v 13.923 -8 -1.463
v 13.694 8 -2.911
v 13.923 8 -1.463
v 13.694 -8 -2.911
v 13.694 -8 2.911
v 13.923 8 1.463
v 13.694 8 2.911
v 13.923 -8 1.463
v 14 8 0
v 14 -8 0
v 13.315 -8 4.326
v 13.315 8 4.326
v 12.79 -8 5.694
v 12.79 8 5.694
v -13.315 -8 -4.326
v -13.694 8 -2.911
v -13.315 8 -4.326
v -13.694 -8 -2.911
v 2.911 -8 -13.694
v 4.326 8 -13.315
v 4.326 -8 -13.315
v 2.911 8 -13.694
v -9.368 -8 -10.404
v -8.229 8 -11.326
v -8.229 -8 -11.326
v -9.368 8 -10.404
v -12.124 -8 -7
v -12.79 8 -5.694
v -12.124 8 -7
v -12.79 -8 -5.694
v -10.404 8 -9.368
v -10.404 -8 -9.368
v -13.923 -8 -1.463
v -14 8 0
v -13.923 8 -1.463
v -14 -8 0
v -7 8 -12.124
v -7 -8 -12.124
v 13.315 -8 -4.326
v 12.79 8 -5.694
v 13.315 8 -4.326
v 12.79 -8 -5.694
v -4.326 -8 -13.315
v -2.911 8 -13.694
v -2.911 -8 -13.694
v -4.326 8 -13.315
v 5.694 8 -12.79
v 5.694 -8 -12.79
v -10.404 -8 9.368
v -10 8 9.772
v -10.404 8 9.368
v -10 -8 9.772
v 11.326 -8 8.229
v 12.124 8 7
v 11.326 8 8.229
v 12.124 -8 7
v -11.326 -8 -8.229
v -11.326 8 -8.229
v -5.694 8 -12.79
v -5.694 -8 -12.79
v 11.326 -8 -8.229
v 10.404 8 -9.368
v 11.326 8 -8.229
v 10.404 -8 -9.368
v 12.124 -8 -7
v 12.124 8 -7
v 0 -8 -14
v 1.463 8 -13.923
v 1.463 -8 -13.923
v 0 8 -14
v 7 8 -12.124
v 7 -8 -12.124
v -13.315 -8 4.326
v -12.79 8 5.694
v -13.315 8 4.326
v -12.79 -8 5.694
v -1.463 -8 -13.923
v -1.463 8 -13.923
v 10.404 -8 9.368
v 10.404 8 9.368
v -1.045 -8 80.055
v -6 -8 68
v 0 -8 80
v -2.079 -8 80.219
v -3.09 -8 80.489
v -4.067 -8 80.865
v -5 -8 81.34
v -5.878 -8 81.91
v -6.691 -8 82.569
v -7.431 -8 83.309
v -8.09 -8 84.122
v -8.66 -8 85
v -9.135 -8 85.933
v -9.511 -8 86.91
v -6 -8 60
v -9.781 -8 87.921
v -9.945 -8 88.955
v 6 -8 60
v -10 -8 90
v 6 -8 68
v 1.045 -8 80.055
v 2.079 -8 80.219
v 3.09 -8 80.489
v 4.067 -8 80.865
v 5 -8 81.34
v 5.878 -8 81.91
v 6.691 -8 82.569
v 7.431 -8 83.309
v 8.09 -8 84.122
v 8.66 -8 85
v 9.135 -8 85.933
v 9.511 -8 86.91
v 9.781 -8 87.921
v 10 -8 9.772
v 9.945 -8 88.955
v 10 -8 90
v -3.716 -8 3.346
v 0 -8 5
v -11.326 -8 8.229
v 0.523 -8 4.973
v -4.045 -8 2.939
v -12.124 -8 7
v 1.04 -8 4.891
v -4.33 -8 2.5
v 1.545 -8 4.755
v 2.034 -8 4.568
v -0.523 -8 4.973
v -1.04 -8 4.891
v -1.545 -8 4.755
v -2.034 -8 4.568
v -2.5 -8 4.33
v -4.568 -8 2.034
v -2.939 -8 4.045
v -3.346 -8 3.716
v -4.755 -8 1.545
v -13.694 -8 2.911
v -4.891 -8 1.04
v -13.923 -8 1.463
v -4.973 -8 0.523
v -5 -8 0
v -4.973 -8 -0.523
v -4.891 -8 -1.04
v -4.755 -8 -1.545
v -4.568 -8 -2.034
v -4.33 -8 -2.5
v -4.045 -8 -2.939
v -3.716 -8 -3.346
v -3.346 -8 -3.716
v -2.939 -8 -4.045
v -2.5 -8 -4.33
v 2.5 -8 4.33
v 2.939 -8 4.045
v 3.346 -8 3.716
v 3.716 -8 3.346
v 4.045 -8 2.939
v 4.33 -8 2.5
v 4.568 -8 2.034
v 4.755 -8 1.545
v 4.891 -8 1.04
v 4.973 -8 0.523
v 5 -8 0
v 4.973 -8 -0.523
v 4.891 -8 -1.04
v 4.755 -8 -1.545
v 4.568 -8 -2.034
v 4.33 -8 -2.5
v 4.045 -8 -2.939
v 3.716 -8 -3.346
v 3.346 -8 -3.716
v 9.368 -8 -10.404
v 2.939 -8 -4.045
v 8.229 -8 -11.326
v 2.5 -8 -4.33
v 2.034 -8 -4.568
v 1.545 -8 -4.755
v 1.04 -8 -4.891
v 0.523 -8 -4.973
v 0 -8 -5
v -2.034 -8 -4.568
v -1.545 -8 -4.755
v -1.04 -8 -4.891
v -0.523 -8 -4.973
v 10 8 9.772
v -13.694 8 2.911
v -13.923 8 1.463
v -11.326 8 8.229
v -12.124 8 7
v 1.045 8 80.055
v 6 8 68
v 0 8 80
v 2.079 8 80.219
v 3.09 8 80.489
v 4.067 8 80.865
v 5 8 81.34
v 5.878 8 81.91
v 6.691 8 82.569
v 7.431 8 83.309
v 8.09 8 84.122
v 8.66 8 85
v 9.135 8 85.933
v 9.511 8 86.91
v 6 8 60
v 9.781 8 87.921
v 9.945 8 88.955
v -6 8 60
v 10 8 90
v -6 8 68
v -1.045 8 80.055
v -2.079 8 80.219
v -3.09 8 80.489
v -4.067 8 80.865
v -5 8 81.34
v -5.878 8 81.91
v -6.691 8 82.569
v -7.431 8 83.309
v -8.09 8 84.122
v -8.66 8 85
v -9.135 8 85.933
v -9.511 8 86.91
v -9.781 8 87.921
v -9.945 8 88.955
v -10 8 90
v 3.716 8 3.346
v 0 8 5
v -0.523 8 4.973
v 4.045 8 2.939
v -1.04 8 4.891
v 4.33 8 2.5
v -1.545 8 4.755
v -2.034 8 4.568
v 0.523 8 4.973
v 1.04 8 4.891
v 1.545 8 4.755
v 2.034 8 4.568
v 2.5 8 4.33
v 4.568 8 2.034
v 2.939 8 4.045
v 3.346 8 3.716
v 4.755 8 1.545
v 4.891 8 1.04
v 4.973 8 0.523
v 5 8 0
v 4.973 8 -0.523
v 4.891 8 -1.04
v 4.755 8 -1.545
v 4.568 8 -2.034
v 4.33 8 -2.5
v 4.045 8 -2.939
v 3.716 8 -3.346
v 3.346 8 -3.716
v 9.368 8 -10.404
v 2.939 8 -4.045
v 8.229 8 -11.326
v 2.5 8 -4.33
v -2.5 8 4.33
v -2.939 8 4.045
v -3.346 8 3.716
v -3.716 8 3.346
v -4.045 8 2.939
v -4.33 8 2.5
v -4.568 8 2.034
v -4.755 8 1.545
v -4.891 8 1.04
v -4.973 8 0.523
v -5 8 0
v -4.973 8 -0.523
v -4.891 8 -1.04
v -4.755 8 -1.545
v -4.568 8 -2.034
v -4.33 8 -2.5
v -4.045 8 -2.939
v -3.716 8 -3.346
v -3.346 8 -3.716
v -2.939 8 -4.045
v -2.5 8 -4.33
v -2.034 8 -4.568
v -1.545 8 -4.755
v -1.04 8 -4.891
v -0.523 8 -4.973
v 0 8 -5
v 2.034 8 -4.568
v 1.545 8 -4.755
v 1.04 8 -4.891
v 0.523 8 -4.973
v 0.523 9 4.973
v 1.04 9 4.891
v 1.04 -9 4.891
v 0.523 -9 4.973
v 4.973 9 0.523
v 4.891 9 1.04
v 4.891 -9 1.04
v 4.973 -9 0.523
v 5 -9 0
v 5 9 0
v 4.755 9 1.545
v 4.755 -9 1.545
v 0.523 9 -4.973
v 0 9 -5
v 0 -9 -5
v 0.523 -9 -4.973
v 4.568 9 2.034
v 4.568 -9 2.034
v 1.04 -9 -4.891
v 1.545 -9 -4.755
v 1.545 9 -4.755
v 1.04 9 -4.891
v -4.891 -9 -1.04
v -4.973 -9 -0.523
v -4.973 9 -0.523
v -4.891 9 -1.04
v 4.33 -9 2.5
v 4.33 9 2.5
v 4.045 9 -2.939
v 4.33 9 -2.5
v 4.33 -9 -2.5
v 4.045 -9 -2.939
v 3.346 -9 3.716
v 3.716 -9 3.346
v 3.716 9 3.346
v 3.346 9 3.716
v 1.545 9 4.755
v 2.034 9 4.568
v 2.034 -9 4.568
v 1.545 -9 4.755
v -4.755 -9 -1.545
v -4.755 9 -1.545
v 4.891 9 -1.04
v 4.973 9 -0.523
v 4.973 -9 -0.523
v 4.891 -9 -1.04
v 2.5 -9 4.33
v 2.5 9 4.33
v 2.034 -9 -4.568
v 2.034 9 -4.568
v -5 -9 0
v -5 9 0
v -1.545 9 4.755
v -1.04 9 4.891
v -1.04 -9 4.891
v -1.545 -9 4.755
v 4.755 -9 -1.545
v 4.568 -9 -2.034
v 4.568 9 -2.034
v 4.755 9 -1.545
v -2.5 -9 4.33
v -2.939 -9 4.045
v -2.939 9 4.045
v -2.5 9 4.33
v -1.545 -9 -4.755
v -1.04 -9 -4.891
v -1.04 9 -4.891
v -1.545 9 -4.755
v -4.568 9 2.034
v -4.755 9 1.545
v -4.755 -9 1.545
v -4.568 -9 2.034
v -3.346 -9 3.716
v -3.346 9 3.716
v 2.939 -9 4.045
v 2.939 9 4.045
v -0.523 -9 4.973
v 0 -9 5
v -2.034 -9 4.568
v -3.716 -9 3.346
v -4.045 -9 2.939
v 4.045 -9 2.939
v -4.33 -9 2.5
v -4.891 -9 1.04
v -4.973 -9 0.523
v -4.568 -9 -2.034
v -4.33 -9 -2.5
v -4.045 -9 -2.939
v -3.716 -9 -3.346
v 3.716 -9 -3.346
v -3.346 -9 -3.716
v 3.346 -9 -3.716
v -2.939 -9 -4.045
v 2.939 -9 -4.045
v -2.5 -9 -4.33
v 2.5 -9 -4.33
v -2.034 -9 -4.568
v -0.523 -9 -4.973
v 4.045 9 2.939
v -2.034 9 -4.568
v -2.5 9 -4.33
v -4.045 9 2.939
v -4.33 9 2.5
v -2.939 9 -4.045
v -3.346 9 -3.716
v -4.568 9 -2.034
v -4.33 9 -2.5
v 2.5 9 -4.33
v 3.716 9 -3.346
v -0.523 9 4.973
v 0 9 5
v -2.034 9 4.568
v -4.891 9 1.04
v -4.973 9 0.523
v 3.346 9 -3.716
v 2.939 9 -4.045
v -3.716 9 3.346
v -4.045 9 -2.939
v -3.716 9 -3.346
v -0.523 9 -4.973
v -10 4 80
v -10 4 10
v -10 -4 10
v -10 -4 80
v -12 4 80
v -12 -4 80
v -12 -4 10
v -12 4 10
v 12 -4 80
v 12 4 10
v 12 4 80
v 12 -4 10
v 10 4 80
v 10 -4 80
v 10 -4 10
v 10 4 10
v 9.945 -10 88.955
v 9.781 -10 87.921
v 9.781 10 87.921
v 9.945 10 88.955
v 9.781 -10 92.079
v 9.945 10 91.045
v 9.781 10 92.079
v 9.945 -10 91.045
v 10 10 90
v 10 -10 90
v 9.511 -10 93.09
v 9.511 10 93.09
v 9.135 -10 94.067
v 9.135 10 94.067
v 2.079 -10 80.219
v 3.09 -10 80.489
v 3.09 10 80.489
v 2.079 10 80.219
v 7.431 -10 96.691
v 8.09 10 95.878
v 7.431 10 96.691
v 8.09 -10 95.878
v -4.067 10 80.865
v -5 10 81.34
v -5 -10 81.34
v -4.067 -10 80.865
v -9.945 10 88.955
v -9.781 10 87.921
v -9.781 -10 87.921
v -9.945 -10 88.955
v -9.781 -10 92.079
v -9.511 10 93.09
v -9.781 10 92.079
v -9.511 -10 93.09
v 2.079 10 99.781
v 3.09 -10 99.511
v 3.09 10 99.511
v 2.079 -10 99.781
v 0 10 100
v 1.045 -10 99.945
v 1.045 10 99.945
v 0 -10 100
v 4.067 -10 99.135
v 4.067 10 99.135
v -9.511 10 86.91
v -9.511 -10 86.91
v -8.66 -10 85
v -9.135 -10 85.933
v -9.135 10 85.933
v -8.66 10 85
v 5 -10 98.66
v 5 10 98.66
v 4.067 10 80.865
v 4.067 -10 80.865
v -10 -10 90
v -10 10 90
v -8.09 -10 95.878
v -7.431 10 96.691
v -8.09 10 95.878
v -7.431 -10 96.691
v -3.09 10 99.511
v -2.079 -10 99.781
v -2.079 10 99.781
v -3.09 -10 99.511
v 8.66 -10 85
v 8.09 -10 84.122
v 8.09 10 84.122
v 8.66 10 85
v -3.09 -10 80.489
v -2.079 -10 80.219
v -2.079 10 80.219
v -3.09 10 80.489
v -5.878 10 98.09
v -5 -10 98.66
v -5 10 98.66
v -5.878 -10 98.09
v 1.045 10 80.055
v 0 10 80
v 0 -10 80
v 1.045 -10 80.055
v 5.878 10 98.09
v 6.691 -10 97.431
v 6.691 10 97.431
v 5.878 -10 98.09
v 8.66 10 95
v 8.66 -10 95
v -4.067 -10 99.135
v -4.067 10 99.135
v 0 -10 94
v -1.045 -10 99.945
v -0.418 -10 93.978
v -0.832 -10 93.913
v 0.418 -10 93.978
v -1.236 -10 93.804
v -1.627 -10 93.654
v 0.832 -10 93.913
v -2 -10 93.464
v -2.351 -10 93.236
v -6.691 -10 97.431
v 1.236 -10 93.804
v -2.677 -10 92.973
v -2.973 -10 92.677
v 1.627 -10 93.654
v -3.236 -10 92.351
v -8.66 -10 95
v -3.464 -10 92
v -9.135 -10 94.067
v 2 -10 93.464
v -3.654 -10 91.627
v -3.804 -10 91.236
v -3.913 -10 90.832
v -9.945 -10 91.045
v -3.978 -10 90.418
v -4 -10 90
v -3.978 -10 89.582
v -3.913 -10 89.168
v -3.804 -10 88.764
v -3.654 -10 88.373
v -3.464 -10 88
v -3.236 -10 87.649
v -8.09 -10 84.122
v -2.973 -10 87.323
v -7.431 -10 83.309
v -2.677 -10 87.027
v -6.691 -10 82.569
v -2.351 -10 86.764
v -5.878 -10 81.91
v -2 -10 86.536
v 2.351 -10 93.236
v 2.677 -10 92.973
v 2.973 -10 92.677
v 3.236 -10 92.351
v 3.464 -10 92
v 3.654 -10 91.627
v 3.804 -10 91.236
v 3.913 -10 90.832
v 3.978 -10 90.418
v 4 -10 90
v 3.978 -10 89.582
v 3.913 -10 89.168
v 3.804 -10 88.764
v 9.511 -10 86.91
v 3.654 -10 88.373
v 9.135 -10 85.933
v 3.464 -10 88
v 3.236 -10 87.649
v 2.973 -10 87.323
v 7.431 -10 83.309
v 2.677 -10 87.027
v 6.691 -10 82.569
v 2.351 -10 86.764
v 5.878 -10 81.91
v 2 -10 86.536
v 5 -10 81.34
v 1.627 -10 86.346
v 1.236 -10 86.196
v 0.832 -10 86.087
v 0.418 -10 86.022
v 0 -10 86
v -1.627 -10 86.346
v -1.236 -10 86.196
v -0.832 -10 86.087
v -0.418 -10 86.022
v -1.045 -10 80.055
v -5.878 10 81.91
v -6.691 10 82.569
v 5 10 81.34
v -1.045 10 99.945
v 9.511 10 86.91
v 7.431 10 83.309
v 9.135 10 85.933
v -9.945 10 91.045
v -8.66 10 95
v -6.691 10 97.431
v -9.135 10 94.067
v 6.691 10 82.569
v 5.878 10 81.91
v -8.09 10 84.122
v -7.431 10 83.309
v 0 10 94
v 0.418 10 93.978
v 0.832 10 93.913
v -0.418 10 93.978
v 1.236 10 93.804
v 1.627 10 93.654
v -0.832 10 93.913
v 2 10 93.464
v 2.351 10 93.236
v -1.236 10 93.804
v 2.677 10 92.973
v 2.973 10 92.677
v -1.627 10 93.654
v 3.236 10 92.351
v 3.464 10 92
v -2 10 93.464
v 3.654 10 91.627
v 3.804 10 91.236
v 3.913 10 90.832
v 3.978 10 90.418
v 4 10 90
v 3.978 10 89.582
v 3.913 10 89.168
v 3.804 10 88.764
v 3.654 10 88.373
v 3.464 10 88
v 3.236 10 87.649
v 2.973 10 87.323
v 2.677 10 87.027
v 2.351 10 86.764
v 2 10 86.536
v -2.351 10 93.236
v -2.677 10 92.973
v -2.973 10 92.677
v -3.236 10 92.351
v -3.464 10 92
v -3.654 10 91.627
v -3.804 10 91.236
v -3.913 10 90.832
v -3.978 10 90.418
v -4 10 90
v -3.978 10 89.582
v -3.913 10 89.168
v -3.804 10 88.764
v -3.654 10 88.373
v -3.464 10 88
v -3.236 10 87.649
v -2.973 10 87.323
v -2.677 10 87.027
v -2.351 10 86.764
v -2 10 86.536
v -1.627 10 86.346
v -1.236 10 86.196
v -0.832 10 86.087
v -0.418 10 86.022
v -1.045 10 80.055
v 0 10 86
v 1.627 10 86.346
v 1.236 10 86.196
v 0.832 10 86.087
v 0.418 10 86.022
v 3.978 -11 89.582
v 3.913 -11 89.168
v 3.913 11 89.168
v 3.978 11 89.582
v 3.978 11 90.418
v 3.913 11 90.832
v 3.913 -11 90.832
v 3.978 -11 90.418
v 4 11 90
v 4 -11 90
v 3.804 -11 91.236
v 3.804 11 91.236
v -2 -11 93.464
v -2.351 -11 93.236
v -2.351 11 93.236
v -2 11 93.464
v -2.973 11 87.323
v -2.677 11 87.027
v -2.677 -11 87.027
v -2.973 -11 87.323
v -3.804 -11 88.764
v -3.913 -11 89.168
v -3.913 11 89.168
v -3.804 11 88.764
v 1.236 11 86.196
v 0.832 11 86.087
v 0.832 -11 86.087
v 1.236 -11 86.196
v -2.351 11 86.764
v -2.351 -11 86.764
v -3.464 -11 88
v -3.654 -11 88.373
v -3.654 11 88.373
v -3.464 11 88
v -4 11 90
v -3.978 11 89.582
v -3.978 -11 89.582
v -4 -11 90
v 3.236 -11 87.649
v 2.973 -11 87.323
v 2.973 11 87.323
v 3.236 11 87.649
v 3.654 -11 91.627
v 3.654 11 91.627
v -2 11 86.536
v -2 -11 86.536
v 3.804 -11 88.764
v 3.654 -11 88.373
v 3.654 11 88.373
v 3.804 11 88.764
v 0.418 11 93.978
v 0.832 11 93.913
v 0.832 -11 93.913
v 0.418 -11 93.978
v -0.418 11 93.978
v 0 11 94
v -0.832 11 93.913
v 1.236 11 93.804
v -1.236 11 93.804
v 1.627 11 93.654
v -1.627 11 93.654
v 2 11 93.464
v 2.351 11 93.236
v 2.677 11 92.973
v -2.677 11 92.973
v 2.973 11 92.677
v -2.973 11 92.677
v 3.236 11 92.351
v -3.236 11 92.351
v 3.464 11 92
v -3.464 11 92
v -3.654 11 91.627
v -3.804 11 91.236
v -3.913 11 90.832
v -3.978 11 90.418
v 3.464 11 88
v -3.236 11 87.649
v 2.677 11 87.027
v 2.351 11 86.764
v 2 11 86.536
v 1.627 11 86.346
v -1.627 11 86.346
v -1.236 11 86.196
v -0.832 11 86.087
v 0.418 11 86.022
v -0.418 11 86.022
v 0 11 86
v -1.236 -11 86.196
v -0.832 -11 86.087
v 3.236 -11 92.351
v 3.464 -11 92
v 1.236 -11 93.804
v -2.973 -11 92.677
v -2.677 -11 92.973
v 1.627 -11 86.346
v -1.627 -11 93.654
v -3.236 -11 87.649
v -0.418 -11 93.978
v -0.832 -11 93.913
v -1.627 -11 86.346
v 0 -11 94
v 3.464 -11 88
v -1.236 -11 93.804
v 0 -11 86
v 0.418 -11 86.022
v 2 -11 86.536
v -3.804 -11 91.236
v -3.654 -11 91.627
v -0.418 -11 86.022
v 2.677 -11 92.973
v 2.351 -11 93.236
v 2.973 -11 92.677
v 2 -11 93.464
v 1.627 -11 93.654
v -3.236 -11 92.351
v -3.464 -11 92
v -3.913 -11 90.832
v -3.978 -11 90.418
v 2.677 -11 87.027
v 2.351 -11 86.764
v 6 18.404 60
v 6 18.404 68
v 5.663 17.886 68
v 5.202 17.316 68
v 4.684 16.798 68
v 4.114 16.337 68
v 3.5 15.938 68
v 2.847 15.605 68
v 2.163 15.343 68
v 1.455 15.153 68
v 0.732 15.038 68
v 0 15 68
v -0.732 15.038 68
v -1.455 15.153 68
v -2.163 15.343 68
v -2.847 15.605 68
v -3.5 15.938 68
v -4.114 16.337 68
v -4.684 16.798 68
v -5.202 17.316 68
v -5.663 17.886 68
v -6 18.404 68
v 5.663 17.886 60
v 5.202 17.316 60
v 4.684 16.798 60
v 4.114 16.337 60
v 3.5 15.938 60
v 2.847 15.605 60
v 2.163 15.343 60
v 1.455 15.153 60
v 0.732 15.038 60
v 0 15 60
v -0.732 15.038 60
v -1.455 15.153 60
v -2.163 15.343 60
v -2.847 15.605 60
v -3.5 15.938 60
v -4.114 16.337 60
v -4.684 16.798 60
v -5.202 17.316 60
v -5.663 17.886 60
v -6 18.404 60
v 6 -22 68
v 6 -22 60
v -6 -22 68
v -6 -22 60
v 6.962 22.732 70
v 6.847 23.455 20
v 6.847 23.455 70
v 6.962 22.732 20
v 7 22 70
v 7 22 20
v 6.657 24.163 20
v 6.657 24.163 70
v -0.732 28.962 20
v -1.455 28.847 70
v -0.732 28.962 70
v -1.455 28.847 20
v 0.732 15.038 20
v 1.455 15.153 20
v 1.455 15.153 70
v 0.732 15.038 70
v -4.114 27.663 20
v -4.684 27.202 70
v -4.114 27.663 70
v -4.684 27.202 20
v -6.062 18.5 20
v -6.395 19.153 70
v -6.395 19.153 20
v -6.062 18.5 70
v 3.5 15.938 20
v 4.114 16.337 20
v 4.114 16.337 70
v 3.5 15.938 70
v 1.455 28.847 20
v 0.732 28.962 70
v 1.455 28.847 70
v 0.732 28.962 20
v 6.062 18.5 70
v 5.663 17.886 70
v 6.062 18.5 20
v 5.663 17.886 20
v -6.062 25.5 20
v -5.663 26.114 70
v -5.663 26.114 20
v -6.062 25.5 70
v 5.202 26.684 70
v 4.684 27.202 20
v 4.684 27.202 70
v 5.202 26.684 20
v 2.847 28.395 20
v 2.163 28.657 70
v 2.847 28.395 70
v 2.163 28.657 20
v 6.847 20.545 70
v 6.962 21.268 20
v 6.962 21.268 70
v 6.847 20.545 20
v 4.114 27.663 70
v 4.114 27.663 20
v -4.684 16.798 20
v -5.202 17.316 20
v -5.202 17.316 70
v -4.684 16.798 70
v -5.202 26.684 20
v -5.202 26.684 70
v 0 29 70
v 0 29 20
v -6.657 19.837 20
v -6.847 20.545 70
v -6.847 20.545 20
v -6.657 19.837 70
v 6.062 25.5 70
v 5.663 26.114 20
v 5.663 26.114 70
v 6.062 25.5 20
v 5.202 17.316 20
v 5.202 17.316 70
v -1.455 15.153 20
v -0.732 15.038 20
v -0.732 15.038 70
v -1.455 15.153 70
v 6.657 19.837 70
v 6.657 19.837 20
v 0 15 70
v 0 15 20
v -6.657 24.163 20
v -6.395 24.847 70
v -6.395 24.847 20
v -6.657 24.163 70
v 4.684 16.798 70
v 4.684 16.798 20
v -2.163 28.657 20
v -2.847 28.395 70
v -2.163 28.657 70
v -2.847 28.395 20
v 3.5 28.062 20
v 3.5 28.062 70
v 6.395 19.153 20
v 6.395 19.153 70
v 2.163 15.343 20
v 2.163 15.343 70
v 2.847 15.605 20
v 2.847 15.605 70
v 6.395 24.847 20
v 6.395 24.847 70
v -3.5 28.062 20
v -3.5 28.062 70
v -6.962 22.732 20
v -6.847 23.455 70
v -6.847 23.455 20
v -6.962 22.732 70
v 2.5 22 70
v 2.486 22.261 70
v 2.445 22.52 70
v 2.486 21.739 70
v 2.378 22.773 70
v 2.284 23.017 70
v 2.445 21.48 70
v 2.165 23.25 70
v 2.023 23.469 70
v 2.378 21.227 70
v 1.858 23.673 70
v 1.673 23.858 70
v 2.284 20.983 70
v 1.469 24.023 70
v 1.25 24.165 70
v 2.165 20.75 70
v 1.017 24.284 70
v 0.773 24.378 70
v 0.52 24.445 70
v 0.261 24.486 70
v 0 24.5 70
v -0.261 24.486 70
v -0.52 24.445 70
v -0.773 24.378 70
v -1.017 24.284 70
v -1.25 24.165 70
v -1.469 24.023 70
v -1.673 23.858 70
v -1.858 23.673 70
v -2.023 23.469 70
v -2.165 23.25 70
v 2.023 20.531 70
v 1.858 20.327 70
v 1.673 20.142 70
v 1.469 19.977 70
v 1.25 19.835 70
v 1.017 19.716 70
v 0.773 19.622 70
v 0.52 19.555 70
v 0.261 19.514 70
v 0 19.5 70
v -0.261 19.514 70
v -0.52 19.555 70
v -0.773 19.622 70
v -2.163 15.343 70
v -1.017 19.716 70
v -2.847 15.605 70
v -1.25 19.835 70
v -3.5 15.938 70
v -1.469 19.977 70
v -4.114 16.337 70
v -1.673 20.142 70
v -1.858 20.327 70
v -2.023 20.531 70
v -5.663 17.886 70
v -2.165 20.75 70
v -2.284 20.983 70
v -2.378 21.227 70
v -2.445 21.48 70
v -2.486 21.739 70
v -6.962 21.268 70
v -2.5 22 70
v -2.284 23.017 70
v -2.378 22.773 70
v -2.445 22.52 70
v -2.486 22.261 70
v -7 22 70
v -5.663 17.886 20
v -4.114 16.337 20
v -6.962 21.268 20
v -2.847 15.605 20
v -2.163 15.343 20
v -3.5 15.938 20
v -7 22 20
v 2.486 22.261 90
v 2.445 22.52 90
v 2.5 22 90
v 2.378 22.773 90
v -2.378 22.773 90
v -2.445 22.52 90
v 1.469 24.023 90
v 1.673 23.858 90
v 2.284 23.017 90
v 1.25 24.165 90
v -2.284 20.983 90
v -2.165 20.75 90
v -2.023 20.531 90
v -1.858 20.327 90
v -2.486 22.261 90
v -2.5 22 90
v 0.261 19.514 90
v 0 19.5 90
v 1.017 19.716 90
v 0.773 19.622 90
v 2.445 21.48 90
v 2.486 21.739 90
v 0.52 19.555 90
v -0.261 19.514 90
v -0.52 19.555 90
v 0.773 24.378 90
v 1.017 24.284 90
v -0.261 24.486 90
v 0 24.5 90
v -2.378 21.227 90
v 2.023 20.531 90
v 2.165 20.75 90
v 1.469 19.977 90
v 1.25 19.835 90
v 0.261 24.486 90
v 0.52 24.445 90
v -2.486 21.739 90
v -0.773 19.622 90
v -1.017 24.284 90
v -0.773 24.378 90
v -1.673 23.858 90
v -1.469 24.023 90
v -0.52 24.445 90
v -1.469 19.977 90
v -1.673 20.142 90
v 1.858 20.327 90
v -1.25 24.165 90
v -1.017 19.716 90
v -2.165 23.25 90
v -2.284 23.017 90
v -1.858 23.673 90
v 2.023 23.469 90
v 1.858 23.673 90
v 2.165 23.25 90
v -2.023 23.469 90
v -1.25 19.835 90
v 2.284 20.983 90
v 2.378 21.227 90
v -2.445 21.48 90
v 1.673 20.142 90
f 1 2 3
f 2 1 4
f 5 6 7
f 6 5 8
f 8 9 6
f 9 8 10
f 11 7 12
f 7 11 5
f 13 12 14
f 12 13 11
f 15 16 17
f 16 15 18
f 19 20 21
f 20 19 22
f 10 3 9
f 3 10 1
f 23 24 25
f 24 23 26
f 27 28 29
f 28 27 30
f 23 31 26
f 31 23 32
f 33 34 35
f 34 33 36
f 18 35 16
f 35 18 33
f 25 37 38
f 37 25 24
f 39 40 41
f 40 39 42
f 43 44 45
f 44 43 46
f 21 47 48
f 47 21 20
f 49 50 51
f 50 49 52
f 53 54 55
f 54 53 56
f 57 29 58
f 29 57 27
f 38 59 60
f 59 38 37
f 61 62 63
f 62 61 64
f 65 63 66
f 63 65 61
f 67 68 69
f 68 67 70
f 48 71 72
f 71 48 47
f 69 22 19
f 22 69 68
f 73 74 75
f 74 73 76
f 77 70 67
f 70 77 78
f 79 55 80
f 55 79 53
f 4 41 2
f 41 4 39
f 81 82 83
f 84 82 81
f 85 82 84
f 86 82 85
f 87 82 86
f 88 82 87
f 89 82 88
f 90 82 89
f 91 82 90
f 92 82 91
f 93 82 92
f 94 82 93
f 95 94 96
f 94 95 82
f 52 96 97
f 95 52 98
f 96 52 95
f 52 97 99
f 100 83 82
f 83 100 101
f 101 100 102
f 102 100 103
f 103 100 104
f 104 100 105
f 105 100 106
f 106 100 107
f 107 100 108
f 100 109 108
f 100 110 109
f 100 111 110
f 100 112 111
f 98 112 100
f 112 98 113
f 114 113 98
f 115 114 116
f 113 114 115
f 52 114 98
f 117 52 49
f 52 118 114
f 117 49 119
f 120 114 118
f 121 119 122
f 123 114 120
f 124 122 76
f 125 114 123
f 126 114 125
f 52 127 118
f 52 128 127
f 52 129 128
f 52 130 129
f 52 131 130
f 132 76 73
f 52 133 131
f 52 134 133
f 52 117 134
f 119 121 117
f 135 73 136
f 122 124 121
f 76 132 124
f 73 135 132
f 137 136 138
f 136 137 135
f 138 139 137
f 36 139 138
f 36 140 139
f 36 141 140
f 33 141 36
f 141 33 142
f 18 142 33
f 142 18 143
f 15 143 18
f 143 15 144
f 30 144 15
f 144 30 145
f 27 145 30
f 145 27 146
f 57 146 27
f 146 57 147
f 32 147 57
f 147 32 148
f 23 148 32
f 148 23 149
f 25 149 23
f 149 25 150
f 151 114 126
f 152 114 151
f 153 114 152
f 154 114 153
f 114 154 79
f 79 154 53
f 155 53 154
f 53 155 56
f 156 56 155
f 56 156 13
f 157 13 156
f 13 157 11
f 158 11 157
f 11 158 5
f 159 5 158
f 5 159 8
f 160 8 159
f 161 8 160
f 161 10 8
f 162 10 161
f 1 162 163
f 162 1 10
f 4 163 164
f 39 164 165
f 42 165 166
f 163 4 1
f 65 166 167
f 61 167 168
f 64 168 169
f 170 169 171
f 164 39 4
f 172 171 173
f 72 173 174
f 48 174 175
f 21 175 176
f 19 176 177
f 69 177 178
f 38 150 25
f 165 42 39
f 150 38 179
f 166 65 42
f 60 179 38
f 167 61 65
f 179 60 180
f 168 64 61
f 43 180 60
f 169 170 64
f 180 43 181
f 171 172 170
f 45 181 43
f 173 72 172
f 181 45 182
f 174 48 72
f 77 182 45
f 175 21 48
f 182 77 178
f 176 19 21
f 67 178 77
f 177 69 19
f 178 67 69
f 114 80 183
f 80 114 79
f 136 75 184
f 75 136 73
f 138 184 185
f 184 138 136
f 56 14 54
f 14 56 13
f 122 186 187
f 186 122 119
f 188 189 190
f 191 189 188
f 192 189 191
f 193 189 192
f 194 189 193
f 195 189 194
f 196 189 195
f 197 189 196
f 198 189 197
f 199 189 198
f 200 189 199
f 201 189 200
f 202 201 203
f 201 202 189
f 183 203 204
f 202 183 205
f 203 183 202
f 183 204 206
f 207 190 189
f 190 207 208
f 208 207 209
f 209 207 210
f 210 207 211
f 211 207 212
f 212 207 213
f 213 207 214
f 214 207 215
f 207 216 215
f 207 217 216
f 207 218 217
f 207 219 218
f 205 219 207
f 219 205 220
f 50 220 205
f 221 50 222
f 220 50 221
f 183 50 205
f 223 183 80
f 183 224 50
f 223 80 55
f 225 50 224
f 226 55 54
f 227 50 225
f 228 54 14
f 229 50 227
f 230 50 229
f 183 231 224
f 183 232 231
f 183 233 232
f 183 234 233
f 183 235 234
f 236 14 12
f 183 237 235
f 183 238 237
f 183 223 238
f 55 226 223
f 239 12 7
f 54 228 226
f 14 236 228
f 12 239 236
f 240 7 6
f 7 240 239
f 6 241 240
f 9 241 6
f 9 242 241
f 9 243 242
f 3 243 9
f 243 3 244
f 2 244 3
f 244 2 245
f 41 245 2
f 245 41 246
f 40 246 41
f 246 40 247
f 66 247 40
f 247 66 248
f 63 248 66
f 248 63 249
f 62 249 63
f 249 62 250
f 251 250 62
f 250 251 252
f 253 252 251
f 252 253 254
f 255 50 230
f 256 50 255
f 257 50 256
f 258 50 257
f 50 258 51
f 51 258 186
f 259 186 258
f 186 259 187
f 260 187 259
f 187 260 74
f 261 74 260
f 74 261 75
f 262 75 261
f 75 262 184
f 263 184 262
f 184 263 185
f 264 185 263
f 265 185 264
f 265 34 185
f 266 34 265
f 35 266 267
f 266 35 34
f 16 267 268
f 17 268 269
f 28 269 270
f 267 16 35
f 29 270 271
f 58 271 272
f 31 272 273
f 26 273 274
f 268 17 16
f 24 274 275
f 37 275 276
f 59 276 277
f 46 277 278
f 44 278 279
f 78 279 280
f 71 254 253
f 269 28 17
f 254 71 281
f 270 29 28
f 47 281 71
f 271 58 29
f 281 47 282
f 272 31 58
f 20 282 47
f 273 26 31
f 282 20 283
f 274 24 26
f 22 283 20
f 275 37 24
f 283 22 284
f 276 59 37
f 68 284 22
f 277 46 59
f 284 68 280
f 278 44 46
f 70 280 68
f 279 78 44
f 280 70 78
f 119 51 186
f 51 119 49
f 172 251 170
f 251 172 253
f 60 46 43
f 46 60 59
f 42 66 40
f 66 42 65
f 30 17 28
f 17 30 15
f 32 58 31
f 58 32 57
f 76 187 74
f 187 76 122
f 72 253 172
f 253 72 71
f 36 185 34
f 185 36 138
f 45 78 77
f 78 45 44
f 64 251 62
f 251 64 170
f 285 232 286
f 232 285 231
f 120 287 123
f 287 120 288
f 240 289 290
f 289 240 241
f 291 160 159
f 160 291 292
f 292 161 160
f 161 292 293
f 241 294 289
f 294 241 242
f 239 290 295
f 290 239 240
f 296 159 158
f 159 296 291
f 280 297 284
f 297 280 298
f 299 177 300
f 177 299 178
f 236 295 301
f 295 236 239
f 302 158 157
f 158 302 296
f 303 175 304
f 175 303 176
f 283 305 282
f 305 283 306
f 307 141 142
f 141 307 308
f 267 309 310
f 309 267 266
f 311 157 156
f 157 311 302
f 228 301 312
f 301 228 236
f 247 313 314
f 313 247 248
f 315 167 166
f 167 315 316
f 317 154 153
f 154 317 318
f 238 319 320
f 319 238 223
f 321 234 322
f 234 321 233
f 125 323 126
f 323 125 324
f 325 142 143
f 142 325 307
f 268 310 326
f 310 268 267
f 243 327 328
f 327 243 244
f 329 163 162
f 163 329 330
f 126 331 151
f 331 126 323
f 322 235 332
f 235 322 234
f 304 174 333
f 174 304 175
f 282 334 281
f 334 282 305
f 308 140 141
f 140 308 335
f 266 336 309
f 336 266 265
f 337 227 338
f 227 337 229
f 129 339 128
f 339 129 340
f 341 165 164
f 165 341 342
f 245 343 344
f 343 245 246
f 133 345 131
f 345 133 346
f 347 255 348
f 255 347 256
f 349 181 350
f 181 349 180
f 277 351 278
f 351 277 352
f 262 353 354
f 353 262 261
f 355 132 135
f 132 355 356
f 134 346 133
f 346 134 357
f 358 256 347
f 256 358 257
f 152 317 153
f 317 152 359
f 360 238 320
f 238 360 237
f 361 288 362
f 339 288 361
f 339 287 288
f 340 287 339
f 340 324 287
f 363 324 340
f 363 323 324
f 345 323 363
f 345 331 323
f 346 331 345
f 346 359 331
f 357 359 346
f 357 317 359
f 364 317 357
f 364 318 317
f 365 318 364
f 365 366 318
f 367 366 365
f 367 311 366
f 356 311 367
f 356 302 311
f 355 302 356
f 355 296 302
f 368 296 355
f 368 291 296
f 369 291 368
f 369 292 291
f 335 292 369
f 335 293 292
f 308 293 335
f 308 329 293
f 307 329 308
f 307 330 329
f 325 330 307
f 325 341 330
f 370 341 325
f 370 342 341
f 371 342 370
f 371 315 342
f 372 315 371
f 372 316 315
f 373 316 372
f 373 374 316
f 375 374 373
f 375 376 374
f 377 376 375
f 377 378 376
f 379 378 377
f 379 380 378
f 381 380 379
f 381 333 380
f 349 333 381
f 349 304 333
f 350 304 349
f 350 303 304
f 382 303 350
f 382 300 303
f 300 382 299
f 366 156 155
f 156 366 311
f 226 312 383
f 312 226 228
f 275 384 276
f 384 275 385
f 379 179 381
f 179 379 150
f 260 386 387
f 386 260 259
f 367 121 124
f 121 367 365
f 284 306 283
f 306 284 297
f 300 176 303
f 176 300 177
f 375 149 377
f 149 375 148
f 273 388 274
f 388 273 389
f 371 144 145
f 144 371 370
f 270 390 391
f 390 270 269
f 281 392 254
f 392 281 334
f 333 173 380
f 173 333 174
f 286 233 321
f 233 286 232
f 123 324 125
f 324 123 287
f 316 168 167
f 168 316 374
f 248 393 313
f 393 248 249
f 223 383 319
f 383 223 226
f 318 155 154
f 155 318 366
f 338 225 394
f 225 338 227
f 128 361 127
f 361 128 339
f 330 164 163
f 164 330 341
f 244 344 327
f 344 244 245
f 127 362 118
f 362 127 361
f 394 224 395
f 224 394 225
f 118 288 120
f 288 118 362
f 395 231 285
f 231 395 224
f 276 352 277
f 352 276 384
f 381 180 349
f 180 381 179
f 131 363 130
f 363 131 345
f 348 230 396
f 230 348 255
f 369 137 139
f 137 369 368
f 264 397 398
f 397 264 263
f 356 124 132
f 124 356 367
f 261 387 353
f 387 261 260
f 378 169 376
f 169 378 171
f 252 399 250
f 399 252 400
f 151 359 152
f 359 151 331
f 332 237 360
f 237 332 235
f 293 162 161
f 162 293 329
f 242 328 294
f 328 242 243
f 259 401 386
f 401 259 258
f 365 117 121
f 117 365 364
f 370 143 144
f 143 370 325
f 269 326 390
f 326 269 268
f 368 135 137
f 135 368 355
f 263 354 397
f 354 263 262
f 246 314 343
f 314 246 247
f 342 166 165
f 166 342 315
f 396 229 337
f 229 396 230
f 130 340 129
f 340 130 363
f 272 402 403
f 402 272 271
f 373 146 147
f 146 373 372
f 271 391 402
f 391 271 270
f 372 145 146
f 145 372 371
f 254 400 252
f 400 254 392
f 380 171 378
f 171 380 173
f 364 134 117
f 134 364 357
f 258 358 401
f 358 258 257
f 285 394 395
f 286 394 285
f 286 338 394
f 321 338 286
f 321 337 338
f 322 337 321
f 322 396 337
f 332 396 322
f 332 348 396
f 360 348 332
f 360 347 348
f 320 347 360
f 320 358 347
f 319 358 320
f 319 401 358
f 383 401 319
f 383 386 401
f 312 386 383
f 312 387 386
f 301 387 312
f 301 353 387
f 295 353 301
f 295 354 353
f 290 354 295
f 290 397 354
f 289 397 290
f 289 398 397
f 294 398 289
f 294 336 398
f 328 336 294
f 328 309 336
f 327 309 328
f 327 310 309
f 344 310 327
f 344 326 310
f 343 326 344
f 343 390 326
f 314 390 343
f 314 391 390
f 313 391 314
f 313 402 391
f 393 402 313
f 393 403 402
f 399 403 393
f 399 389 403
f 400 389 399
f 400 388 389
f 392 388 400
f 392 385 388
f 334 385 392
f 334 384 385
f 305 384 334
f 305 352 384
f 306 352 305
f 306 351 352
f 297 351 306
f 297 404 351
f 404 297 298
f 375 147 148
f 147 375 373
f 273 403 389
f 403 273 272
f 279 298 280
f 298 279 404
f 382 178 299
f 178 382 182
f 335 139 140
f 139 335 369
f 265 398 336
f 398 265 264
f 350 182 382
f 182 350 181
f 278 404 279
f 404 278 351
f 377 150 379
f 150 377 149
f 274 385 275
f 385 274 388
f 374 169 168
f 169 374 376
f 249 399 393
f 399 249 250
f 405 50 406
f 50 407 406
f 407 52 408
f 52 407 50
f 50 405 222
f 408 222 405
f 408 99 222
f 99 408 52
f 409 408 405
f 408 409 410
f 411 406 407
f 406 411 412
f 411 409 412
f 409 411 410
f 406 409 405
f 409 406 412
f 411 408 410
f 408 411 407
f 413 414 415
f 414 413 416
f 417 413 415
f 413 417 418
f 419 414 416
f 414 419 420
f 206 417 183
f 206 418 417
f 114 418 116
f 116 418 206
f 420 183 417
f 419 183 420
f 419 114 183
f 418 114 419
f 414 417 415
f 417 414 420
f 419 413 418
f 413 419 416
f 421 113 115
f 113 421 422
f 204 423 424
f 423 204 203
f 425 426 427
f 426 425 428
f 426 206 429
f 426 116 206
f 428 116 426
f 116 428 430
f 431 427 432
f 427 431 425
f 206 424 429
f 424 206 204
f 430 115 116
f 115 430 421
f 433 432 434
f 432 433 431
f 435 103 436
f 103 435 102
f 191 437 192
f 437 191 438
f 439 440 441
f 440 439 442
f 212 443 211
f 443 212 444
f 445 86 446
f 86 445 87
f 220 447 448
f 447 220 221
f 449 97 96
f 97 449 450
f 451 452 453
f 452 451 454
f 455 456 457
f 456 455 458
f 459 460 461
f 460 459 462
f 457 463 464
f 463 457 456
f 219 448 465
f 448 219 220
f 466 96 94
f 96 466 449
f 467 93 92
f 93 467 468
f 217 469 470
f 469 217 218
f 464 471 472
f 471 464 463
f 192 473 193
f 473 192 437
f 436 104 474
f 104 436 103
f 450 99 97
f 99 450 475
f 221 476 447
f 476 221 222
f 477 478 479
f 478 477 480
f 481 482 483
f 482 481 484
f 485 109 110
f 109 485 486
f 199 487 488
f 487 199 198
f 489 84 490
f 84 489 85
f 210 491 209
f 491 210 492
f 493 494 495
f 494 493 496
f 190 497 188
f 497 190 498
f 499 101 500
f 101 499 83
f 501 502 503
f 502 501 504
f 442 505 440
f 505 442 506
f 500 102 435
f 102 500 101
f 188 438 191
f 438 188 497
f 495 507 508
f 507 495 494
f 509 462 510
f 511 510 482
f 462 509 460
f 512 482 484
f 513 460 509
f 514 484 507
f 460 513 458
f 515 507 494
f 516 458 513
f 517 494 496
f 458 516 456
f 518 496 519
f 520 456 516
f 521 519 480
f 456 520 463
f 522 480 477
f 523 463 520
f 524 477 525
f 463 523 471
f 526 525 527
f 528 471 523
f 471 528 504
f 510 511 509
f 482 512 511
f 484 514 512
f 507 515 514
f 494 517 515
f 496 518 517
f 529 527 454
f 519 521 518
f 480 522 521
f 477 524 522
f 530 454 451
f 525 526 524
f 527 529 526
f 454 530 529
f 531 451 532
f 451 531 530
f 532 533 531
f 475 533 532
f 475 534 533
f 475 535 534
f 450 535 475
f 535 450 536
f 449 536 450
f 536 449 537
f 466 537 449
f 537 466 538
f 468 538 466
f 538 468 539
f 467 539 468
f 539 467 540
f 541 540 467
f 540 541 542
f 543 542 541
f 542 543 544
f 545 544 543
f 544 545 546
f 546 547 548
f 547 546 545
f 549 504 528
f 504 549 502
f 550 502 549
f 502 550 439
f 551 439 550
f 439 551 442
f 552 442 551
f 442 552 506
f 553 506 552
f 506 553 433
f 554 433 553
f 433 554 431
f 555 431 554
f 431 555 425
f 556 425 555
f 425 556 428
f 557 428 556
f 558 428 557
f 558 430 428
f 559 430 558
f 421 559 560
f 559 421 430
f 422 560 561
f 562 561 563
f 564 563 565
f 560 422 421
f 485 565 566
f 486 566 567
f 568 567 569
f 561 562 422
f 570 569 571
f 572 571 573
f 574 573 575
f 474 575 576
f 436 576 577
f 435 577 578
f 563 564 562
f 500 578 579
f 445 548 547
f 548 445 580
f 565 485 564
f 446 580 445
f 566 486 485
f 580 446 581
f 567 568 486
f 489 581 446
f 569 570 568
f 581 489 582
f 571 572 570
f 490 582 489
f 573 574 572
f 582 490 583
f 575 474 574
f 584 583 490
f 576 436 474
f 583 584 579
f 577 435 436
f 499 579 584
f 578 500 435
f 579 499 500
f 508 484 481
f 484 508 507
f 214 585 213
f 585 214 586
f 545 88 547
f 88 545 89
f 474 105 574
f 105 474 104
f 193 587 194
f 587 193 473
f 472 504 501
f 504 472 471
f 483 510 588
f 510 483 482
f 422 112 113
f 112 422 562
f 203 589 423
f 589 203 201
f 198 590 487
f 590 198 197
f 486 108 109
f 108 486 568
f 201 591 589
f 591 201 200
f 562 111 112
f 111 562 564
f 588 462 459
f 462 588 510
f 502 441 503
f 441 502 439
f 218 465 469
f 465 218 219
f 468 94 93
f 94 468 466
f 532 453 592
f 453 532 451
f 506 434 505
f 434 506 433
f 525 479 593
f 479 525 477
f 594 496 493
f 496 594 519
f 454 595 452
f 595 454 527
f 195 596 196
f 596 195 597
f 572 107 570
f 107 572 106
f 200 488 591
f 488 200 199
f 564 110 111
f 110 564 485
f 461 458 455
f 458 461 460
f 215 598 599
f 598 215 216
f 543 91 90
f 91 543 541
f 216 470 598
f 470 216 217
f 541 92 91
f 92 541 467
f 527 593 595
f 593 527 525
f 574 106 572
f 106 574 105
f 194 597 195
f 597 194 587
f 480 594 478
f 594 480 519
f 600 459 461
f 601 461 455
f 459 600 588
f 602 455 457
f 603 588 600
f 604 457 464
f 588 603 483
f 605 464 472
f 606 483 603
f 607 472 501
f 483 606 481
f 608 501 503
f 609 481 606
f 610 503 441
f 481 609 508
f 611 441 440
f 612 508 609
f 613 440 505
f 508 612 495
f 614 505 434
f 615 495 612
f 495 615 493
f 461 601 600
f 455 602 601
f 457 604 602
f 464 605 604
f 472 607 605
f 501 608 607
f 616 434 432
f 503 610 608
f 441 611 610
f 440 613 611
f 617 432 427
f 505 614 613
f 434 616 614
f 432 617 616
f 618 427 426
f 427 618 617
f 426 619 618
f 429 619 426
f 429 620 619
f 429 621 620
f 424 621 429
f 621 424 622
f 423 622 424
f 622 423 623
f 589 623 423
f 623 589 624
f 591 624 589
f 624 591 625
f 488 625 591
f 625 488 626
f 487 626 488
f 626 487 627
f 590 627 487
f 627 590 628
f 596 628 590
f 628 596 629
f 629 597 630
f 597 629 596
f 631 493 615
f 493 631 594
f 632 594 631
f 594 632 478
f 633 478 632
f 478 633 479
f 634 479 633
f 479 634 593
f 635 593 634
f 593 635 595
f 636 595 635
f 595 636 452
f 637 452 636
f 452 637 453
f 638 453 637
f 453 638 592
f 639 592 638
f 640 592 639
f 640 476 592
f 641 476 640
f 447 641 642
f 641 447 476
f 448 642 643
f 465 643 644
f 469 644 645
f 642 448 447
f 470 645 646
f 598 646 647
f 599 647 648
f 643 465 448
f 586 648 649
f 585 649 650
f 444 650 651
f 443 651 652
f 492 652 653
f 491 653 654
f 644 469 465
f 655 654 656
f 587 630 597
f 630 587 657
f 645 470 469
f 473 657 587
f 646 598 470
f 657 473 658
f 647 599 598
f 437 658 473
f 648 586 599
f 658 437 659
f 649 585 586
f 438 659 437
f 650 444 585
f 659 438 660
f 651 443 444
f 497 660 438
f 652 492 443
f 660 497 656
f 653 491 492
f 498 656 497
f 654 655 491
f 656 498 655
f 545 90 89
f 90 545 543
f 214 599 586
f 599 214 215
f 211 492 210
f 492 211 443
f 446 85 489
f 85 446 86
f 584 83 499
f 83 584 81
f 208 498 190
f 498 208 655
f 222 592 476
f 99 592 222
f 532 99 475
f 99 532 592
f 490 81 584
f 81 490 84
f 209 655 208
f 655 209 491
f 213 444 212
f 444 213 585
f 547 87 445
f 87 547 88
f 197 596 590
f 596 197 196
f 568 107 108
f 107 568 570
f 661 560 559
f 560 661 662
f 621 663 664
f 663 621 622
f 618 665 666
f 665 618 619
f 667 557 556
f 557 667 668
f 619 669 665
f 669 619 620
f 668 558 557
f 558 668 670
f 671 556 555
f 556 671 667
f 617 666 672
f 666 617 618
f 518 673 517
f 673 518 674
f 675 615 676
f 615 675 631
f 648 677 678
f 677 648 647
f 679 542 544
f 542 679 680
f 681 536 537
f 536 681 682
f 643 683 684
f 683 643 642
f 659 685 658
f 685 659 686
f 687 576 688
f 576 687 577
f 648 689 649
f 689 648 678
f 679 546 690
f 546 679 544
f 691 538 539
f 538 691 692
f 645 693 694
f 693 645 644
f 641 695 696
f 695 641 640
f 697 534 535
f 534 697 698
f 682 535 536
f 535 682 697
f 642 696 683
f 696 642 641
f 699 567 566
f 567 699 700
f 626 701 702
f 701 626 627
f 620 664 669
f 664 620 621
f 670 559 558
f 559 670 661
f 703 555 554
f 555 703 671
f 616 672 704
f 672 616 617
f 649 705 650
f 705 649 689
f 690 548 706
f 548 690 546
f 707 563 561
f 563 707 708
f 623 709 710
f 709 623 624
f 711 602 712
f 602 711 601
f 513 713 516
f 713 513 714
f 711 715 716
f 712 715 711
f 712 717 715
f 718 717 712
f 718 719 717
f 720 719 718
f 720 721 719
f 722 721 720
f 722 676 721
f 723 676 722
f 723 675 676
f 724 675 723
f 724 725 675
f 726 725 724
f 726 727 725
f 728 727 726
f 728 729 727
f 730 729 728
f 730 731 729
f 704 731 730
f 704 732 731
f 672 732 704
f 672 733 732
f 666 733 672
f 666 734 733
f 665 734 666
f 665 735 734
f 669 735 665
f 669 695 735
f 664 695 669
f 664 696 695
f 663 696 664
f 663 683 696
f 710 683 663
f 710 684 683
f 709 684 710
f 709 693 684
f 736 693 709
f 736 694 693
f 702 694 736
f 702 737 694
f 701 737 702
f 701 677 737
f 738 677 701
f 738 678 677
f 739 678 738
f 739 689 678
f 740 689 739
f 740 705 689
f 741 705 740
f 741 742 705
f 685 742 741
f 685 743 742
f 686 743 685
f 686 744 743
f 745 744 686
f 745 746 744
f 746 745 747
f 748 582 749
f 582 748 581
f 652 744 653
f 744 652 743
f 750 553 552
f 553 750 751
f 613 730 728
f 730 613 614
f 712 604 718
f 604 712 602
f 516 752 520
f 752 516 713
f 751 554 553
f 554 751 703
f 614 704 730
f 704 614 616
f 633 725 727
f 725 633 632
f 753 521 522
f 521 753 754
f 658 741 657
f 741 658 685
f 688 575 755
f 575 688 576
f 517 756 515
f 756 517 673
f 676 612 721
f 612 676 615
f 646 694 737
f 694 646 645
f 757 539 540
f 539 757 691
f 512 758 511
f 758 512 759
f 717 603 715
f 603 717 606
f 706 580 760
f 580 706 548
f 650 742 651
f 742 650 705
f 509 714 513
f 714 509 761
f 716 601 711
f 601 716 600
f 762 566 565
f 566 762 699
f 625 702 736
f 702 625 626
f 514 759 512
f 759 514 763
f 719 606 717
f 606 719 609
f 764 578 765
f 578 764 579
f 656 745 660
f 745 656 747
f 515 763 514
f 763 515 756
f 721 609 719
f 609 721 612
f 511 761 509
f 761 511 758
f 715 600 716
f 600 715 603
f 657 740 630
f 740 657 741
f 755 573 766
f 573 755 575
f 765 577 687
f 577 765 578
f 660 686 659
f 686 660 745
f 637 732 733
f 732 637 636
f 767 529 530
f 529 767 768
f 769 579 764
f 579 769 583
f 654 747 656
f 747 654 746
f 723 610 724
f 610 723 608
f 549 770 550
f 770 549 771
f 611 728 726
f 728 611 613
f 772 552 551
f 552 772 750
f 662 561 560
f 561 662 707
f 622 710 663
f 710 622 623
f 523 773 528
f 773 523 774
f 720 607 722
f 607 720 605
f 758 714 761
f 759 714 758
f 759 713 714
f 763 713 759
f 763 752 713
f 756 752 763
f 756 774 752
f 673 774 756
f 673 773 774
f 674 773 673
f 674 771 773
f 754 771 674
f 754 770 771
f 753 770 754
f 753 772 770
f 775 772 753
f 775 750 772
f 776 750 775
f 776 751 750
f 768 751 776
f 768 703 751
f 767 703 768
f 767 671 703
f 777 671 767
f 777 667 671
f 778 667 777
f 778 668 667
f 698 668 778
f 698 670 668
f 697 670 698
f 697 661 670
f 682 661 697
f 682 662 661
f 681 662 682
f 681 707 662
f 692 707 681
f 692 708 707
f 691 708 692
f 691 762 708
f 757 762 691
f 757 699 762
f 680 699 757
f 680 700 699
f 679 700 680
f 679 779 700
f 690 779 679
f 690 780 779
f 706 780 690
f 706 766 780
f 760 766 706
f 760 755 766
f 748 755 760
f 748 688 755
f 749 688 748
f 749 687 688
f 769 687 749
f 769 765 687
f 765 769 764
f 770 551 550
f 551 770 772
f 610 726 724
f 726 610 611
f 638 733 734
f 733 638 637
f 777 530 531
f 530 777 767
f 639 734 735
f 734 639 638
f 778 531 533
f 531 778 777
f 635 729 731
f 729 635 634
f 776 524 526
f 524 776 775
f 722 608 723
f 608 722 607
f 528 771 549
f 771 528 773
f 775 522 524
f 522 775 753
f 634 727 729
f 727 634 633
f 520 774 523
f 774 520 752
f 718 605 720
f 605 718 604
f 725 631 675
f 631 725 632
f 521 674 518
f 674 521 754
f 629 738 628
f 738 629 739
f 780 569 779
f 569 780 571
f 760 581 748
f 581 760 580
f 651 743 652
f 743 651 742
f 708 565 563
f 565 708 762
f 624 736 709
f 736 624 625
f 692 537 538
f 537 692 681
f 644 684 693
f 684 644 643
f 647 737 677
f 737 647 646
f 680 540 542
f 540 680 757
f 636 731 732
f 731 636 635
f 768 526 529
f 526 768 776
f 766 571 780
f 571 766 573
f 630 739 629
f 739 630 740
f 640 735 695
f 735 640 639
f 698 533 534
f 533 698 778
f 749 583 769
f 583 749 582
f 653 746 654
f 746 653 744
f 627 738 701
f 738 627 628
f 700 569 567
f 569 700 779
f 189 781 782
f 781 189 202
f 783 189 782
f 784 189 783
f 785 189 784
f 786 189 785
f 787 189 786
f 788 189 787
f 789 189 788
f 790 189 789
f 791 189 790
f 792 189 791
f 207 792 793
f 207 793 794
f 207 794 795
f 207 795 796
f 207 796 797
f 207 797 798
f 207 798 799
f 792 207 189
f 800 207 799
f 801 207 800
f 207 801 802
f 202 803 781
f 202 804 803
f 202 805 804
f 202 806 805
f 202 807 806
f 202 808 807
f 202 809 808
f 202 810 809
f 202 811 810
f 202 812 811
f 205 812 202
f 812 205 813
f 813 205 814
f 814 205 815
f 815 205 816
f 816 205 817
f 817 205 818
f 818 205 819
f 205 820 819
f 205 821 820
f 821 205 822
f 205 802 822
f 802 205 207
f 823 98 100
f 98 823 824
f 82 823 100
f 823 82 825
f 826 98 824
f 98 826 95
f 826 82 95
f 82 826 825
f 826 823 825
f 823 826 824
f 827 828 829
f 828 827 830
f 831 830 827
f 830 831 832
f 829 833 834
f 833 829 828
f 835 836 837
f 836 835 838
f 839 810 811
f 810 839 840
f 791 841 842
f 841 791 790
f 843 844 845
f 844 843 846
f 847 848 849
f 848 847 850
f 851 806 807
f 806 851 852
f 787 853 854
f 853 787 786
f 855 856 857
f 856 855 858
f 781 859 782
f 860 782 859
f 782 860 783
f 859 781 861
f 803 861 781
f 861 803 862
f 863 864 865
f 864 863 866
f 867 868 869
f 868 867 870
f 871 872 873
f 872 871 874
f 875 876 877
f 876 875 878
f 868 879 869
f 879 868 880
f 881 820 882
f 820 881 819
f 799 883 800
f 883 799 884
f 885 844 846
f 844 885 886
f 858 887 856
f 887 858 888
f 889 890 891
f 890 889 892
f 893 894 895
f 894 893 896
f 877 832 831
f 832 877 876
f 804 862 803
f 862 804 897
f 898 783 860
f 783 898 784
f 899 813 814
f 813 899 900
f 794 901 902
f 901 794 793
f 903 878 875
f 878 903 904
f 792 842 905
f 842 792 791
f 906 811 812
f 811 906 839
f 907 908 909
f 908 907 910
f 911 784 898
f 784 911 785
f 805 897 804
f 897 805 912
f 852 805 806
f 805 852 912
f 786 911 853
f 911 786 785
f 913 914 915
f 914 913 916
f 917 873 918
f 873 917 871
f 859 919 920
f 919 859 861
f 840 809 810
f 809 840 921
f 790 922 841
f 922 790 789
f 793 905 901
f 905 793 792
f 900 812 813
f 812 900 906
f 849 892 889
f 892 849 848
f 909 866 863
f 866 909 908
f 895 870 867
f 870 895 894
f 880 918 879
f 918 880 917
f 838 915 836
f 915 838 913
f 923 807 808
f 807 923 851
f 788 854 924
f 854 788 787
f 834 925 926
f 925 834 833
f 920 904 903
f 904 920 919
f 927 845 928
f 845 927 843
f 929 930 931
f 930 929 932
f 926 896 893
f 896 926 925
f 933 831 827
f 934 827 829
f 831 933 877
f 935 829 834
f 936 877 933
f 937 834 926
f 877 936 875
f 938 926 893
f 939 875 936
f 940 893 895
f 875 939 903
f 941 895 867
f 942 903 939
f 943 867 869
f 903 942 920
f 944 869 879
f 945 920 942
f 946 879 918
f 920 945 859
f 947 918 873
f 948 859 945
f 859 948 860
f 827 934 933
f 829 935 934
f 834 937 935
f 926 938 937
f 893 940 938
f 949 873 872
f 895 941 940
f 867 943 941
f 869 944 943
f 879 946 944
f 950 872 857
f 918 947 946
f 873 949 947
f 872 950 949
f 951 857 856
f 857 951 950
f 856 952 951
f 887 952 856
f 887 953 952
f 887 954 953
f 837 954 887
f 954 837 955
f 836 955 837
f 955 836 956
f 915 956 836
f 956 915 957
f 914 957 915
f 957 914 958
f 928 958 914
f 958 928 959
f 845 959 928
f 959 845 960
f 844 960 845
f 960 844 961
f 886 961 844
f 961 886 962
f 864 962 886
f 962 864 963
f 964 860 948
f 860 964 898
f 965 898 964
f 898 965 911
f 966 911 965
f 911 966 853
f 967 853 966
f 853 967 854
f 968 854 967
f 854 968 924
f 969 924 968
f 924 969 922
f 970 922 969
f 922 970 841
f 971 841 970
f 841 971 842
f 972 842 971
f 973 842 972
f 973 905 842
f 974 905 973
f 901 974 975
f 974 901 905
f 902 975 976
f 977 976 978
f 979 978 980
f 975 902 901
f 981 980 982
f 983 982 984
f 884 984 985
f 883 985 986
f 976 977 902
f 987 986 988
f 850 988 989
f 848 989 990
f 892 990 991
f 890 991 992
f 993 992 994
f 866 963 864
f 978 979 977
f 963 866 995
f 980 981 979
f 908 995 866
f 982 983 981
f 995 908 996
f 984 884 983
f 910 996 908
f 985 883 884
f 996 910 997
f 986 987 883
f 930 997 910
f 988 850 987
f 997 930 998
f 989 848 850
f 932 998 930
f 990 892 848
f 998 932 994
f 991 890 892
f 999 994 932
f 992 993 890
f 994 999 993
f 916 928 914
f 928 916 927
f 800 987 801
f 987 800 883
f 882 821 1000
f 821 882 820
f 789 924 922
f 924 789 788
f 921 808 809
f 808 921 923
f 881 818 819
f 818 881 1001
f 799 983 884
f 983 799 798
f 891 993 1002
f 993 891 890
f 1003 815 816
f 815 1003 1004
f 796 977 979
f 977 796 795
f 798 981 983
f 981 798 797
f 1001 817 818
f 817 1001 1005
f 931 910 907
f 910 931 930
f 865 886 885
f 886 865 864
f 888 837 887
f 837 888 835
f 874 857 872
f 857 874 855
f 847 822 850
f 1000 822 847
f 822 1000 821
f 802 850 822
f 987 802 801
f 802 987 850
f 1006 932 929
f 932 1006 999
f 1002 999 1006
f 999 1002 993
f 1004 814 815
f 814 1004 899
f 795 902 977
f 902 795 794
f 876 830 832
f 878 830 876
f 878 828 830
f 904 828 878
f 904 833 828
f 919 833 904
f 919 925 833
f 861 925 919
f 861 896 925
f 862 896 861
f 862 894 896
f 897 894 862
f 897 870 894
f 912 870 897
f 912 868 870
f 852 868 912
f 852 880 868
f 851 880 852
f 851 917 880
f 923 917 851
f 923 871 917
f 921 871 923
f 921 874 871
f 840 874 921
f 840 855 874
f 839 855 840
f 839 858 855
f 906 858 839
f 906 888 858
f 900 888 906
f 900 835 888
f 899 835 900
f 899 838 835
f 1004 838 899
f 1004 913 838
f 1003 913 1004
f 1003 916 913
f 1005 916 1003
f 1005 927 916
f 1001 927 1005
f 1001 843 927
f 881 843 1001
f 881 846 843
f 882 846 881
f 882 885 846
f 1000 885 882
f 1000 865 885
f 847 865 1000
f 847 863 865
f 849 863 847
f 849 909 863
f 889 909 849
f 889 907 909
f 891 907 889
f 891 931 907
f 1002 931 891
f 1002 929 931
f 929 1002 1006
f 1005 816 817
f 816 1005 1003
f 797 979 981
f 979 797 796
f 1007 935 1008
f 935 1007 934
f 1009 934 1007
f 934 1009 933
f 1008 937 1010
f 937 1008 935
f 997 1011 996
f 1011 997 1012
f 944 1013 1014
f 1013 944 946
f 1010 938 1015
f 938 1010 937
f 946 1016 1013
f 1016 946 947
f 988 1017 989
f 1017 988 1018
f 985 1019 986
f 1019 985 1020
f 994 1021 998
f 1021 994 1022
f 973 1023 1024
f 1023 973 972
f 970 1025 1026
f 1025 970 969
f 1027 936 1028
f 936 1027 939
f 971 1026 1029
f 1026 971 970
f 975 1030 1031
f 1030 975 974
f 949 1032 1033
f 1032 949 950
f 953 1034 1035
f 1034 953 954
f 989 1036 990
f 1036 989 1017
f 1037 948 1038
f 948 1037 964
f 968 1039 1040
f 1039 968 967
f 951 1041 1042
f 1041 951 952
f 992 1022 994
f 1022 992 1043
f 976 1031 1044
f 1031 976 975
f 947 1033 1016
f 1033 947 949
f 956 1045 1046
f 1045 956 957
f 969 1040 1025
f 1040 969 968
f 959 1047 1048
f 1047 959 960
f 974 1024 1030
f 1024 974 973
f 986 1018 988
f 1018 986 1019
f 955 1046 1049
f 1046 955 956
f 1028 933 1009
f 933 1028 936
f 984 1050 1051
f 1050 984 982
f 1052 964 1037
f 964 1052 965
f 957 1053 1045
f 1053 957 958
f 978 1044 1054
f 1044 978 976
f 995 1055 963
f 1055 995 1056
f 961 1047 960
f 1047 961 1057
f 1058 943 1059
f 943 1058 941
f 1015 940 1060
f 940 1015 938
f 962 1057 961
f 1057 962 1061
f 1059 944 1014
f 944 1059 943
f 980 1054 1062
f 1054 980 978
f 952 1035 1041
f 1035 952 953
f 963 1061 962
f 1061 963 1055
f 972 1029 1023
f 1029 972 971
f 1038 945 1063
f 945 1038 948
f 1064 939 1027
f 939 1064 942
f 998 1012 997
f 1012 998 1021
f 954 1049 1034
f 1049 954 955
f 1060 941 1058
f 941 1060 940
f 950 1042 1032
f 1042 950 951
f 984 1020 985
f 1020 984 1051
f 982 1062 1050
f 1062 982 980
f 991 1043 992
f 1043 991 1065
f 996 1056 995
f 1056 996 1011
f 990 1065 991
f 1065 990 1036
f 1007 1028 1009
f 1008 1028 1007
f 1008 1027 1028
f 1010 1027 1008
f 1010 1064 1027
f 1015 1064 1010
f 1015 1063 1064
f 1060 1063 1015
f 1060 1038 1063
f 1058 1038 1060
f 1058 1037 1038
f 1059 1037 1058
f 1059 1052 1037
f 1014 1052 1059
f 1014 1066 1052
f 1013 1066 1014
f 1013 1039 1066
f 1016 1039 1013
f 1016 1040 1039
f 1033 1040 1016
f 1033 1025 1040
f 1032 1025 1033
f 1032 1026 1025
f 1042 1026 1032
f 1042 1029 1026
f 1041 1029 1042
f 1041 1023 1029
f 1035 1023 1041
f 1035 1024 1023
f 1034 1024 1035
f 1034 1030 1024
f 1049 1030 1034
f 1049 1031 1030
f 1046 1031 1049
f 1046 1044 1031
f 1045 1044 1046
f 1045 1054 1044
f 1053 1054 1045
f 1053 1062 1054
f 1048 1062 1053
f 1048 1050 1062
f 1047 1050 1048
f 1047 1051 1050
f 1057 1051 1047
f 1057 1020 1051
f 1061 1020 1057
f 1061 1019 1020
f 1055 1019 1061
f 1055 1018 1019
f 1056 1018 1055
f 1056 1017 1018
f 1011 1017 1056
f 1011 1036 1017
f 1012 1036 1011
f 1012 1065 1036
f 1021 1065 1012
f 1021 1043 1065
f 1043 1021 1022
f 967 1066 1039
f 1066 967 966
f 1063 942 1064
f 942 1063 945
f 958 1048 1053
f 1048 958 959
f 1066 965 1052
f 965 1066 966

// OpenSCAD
// file: _common.scad
// mechanism 共用設定 + 齒輪 module
$fn = 60;

// 簡化齒輪：N 個齒、節圓半徑 r、齒高 h、齒寬 w
module simple_gear(N = 16, r = 20, h = 4, thick = 6) {
  union() {
    // 主圓盤
    cylinder(h = thick, r = r, center = true);
    // 齒（梯形）
    for (i = [0:N-1]) {
      rotate([0, 0, i * 360 / N])
        translate([r, 0, 0])
          linear_extrude(height = thick, center = true)
            polygon([[0, -2.4], [h, -1.4], [h, 1.4], [0, 2.4]]);
    }
    // 中心凸軸
    cylinder(h = thick * 1.4, r = r * 0.18, center = true);
  }
}
// main file
// 軸2：大臂（上臂）— 肩關節 + 連桿
include <_common.scad>

// 肩關節圓盤
color([0.40, 0.40, 0.43]) {
  rotate([90, 0, 0]) cylinder(h = 16, r = 14, center = true);
  // 關節孔
  color([0.15, 0.15, 0.15]) rotate([90, 0, 0]) cylinder(h = 18, r = 5, center = true);
}

// 大臂本體（矩形截面）
color([0.50, 0.52, 0.55])
  translate([-10, -8, 0]) cube([20, 16, 90]);

// 加強肋（兩側）
color([0.45, 0.46, 0.49]) {
  translate([-12, -4, 10]) cube([2, 8, 70]);
  translate([10, -4, 10]) cube([2, 8, 70]);
}

// 肘關節（上端）
color([0.40, 0.40, 0.43])
  translate([0, 0, 90]) {
    rotate([90, 0, 0]) cylinder(h = 20, r = 10, center = true);
    color([0.15, 0.15, 0.15]) rotate([90, 0, 0]) cylinder(h = 22, r = 4, center = true);
  }

// 針筒接耳（上端）
color([0.35, 0.35, 0.38]) {
  translate([-6, 8, 60]) cube([12, 14, 8]);
  translate([-6, -22, 60]) cube([12, 14, 8]);
}

// 針筒（液壓缸）
color([0.70, 0.78, 0.85, 0.75])
  translate([0, 22, 20]) rotate([0, 0, 0]) cylinder(h = 50, r = 7);
color([0.60, 0.60, 0.65])
  translate([0, 22, 70]) cylinder(h = 20, r = 2.5);
